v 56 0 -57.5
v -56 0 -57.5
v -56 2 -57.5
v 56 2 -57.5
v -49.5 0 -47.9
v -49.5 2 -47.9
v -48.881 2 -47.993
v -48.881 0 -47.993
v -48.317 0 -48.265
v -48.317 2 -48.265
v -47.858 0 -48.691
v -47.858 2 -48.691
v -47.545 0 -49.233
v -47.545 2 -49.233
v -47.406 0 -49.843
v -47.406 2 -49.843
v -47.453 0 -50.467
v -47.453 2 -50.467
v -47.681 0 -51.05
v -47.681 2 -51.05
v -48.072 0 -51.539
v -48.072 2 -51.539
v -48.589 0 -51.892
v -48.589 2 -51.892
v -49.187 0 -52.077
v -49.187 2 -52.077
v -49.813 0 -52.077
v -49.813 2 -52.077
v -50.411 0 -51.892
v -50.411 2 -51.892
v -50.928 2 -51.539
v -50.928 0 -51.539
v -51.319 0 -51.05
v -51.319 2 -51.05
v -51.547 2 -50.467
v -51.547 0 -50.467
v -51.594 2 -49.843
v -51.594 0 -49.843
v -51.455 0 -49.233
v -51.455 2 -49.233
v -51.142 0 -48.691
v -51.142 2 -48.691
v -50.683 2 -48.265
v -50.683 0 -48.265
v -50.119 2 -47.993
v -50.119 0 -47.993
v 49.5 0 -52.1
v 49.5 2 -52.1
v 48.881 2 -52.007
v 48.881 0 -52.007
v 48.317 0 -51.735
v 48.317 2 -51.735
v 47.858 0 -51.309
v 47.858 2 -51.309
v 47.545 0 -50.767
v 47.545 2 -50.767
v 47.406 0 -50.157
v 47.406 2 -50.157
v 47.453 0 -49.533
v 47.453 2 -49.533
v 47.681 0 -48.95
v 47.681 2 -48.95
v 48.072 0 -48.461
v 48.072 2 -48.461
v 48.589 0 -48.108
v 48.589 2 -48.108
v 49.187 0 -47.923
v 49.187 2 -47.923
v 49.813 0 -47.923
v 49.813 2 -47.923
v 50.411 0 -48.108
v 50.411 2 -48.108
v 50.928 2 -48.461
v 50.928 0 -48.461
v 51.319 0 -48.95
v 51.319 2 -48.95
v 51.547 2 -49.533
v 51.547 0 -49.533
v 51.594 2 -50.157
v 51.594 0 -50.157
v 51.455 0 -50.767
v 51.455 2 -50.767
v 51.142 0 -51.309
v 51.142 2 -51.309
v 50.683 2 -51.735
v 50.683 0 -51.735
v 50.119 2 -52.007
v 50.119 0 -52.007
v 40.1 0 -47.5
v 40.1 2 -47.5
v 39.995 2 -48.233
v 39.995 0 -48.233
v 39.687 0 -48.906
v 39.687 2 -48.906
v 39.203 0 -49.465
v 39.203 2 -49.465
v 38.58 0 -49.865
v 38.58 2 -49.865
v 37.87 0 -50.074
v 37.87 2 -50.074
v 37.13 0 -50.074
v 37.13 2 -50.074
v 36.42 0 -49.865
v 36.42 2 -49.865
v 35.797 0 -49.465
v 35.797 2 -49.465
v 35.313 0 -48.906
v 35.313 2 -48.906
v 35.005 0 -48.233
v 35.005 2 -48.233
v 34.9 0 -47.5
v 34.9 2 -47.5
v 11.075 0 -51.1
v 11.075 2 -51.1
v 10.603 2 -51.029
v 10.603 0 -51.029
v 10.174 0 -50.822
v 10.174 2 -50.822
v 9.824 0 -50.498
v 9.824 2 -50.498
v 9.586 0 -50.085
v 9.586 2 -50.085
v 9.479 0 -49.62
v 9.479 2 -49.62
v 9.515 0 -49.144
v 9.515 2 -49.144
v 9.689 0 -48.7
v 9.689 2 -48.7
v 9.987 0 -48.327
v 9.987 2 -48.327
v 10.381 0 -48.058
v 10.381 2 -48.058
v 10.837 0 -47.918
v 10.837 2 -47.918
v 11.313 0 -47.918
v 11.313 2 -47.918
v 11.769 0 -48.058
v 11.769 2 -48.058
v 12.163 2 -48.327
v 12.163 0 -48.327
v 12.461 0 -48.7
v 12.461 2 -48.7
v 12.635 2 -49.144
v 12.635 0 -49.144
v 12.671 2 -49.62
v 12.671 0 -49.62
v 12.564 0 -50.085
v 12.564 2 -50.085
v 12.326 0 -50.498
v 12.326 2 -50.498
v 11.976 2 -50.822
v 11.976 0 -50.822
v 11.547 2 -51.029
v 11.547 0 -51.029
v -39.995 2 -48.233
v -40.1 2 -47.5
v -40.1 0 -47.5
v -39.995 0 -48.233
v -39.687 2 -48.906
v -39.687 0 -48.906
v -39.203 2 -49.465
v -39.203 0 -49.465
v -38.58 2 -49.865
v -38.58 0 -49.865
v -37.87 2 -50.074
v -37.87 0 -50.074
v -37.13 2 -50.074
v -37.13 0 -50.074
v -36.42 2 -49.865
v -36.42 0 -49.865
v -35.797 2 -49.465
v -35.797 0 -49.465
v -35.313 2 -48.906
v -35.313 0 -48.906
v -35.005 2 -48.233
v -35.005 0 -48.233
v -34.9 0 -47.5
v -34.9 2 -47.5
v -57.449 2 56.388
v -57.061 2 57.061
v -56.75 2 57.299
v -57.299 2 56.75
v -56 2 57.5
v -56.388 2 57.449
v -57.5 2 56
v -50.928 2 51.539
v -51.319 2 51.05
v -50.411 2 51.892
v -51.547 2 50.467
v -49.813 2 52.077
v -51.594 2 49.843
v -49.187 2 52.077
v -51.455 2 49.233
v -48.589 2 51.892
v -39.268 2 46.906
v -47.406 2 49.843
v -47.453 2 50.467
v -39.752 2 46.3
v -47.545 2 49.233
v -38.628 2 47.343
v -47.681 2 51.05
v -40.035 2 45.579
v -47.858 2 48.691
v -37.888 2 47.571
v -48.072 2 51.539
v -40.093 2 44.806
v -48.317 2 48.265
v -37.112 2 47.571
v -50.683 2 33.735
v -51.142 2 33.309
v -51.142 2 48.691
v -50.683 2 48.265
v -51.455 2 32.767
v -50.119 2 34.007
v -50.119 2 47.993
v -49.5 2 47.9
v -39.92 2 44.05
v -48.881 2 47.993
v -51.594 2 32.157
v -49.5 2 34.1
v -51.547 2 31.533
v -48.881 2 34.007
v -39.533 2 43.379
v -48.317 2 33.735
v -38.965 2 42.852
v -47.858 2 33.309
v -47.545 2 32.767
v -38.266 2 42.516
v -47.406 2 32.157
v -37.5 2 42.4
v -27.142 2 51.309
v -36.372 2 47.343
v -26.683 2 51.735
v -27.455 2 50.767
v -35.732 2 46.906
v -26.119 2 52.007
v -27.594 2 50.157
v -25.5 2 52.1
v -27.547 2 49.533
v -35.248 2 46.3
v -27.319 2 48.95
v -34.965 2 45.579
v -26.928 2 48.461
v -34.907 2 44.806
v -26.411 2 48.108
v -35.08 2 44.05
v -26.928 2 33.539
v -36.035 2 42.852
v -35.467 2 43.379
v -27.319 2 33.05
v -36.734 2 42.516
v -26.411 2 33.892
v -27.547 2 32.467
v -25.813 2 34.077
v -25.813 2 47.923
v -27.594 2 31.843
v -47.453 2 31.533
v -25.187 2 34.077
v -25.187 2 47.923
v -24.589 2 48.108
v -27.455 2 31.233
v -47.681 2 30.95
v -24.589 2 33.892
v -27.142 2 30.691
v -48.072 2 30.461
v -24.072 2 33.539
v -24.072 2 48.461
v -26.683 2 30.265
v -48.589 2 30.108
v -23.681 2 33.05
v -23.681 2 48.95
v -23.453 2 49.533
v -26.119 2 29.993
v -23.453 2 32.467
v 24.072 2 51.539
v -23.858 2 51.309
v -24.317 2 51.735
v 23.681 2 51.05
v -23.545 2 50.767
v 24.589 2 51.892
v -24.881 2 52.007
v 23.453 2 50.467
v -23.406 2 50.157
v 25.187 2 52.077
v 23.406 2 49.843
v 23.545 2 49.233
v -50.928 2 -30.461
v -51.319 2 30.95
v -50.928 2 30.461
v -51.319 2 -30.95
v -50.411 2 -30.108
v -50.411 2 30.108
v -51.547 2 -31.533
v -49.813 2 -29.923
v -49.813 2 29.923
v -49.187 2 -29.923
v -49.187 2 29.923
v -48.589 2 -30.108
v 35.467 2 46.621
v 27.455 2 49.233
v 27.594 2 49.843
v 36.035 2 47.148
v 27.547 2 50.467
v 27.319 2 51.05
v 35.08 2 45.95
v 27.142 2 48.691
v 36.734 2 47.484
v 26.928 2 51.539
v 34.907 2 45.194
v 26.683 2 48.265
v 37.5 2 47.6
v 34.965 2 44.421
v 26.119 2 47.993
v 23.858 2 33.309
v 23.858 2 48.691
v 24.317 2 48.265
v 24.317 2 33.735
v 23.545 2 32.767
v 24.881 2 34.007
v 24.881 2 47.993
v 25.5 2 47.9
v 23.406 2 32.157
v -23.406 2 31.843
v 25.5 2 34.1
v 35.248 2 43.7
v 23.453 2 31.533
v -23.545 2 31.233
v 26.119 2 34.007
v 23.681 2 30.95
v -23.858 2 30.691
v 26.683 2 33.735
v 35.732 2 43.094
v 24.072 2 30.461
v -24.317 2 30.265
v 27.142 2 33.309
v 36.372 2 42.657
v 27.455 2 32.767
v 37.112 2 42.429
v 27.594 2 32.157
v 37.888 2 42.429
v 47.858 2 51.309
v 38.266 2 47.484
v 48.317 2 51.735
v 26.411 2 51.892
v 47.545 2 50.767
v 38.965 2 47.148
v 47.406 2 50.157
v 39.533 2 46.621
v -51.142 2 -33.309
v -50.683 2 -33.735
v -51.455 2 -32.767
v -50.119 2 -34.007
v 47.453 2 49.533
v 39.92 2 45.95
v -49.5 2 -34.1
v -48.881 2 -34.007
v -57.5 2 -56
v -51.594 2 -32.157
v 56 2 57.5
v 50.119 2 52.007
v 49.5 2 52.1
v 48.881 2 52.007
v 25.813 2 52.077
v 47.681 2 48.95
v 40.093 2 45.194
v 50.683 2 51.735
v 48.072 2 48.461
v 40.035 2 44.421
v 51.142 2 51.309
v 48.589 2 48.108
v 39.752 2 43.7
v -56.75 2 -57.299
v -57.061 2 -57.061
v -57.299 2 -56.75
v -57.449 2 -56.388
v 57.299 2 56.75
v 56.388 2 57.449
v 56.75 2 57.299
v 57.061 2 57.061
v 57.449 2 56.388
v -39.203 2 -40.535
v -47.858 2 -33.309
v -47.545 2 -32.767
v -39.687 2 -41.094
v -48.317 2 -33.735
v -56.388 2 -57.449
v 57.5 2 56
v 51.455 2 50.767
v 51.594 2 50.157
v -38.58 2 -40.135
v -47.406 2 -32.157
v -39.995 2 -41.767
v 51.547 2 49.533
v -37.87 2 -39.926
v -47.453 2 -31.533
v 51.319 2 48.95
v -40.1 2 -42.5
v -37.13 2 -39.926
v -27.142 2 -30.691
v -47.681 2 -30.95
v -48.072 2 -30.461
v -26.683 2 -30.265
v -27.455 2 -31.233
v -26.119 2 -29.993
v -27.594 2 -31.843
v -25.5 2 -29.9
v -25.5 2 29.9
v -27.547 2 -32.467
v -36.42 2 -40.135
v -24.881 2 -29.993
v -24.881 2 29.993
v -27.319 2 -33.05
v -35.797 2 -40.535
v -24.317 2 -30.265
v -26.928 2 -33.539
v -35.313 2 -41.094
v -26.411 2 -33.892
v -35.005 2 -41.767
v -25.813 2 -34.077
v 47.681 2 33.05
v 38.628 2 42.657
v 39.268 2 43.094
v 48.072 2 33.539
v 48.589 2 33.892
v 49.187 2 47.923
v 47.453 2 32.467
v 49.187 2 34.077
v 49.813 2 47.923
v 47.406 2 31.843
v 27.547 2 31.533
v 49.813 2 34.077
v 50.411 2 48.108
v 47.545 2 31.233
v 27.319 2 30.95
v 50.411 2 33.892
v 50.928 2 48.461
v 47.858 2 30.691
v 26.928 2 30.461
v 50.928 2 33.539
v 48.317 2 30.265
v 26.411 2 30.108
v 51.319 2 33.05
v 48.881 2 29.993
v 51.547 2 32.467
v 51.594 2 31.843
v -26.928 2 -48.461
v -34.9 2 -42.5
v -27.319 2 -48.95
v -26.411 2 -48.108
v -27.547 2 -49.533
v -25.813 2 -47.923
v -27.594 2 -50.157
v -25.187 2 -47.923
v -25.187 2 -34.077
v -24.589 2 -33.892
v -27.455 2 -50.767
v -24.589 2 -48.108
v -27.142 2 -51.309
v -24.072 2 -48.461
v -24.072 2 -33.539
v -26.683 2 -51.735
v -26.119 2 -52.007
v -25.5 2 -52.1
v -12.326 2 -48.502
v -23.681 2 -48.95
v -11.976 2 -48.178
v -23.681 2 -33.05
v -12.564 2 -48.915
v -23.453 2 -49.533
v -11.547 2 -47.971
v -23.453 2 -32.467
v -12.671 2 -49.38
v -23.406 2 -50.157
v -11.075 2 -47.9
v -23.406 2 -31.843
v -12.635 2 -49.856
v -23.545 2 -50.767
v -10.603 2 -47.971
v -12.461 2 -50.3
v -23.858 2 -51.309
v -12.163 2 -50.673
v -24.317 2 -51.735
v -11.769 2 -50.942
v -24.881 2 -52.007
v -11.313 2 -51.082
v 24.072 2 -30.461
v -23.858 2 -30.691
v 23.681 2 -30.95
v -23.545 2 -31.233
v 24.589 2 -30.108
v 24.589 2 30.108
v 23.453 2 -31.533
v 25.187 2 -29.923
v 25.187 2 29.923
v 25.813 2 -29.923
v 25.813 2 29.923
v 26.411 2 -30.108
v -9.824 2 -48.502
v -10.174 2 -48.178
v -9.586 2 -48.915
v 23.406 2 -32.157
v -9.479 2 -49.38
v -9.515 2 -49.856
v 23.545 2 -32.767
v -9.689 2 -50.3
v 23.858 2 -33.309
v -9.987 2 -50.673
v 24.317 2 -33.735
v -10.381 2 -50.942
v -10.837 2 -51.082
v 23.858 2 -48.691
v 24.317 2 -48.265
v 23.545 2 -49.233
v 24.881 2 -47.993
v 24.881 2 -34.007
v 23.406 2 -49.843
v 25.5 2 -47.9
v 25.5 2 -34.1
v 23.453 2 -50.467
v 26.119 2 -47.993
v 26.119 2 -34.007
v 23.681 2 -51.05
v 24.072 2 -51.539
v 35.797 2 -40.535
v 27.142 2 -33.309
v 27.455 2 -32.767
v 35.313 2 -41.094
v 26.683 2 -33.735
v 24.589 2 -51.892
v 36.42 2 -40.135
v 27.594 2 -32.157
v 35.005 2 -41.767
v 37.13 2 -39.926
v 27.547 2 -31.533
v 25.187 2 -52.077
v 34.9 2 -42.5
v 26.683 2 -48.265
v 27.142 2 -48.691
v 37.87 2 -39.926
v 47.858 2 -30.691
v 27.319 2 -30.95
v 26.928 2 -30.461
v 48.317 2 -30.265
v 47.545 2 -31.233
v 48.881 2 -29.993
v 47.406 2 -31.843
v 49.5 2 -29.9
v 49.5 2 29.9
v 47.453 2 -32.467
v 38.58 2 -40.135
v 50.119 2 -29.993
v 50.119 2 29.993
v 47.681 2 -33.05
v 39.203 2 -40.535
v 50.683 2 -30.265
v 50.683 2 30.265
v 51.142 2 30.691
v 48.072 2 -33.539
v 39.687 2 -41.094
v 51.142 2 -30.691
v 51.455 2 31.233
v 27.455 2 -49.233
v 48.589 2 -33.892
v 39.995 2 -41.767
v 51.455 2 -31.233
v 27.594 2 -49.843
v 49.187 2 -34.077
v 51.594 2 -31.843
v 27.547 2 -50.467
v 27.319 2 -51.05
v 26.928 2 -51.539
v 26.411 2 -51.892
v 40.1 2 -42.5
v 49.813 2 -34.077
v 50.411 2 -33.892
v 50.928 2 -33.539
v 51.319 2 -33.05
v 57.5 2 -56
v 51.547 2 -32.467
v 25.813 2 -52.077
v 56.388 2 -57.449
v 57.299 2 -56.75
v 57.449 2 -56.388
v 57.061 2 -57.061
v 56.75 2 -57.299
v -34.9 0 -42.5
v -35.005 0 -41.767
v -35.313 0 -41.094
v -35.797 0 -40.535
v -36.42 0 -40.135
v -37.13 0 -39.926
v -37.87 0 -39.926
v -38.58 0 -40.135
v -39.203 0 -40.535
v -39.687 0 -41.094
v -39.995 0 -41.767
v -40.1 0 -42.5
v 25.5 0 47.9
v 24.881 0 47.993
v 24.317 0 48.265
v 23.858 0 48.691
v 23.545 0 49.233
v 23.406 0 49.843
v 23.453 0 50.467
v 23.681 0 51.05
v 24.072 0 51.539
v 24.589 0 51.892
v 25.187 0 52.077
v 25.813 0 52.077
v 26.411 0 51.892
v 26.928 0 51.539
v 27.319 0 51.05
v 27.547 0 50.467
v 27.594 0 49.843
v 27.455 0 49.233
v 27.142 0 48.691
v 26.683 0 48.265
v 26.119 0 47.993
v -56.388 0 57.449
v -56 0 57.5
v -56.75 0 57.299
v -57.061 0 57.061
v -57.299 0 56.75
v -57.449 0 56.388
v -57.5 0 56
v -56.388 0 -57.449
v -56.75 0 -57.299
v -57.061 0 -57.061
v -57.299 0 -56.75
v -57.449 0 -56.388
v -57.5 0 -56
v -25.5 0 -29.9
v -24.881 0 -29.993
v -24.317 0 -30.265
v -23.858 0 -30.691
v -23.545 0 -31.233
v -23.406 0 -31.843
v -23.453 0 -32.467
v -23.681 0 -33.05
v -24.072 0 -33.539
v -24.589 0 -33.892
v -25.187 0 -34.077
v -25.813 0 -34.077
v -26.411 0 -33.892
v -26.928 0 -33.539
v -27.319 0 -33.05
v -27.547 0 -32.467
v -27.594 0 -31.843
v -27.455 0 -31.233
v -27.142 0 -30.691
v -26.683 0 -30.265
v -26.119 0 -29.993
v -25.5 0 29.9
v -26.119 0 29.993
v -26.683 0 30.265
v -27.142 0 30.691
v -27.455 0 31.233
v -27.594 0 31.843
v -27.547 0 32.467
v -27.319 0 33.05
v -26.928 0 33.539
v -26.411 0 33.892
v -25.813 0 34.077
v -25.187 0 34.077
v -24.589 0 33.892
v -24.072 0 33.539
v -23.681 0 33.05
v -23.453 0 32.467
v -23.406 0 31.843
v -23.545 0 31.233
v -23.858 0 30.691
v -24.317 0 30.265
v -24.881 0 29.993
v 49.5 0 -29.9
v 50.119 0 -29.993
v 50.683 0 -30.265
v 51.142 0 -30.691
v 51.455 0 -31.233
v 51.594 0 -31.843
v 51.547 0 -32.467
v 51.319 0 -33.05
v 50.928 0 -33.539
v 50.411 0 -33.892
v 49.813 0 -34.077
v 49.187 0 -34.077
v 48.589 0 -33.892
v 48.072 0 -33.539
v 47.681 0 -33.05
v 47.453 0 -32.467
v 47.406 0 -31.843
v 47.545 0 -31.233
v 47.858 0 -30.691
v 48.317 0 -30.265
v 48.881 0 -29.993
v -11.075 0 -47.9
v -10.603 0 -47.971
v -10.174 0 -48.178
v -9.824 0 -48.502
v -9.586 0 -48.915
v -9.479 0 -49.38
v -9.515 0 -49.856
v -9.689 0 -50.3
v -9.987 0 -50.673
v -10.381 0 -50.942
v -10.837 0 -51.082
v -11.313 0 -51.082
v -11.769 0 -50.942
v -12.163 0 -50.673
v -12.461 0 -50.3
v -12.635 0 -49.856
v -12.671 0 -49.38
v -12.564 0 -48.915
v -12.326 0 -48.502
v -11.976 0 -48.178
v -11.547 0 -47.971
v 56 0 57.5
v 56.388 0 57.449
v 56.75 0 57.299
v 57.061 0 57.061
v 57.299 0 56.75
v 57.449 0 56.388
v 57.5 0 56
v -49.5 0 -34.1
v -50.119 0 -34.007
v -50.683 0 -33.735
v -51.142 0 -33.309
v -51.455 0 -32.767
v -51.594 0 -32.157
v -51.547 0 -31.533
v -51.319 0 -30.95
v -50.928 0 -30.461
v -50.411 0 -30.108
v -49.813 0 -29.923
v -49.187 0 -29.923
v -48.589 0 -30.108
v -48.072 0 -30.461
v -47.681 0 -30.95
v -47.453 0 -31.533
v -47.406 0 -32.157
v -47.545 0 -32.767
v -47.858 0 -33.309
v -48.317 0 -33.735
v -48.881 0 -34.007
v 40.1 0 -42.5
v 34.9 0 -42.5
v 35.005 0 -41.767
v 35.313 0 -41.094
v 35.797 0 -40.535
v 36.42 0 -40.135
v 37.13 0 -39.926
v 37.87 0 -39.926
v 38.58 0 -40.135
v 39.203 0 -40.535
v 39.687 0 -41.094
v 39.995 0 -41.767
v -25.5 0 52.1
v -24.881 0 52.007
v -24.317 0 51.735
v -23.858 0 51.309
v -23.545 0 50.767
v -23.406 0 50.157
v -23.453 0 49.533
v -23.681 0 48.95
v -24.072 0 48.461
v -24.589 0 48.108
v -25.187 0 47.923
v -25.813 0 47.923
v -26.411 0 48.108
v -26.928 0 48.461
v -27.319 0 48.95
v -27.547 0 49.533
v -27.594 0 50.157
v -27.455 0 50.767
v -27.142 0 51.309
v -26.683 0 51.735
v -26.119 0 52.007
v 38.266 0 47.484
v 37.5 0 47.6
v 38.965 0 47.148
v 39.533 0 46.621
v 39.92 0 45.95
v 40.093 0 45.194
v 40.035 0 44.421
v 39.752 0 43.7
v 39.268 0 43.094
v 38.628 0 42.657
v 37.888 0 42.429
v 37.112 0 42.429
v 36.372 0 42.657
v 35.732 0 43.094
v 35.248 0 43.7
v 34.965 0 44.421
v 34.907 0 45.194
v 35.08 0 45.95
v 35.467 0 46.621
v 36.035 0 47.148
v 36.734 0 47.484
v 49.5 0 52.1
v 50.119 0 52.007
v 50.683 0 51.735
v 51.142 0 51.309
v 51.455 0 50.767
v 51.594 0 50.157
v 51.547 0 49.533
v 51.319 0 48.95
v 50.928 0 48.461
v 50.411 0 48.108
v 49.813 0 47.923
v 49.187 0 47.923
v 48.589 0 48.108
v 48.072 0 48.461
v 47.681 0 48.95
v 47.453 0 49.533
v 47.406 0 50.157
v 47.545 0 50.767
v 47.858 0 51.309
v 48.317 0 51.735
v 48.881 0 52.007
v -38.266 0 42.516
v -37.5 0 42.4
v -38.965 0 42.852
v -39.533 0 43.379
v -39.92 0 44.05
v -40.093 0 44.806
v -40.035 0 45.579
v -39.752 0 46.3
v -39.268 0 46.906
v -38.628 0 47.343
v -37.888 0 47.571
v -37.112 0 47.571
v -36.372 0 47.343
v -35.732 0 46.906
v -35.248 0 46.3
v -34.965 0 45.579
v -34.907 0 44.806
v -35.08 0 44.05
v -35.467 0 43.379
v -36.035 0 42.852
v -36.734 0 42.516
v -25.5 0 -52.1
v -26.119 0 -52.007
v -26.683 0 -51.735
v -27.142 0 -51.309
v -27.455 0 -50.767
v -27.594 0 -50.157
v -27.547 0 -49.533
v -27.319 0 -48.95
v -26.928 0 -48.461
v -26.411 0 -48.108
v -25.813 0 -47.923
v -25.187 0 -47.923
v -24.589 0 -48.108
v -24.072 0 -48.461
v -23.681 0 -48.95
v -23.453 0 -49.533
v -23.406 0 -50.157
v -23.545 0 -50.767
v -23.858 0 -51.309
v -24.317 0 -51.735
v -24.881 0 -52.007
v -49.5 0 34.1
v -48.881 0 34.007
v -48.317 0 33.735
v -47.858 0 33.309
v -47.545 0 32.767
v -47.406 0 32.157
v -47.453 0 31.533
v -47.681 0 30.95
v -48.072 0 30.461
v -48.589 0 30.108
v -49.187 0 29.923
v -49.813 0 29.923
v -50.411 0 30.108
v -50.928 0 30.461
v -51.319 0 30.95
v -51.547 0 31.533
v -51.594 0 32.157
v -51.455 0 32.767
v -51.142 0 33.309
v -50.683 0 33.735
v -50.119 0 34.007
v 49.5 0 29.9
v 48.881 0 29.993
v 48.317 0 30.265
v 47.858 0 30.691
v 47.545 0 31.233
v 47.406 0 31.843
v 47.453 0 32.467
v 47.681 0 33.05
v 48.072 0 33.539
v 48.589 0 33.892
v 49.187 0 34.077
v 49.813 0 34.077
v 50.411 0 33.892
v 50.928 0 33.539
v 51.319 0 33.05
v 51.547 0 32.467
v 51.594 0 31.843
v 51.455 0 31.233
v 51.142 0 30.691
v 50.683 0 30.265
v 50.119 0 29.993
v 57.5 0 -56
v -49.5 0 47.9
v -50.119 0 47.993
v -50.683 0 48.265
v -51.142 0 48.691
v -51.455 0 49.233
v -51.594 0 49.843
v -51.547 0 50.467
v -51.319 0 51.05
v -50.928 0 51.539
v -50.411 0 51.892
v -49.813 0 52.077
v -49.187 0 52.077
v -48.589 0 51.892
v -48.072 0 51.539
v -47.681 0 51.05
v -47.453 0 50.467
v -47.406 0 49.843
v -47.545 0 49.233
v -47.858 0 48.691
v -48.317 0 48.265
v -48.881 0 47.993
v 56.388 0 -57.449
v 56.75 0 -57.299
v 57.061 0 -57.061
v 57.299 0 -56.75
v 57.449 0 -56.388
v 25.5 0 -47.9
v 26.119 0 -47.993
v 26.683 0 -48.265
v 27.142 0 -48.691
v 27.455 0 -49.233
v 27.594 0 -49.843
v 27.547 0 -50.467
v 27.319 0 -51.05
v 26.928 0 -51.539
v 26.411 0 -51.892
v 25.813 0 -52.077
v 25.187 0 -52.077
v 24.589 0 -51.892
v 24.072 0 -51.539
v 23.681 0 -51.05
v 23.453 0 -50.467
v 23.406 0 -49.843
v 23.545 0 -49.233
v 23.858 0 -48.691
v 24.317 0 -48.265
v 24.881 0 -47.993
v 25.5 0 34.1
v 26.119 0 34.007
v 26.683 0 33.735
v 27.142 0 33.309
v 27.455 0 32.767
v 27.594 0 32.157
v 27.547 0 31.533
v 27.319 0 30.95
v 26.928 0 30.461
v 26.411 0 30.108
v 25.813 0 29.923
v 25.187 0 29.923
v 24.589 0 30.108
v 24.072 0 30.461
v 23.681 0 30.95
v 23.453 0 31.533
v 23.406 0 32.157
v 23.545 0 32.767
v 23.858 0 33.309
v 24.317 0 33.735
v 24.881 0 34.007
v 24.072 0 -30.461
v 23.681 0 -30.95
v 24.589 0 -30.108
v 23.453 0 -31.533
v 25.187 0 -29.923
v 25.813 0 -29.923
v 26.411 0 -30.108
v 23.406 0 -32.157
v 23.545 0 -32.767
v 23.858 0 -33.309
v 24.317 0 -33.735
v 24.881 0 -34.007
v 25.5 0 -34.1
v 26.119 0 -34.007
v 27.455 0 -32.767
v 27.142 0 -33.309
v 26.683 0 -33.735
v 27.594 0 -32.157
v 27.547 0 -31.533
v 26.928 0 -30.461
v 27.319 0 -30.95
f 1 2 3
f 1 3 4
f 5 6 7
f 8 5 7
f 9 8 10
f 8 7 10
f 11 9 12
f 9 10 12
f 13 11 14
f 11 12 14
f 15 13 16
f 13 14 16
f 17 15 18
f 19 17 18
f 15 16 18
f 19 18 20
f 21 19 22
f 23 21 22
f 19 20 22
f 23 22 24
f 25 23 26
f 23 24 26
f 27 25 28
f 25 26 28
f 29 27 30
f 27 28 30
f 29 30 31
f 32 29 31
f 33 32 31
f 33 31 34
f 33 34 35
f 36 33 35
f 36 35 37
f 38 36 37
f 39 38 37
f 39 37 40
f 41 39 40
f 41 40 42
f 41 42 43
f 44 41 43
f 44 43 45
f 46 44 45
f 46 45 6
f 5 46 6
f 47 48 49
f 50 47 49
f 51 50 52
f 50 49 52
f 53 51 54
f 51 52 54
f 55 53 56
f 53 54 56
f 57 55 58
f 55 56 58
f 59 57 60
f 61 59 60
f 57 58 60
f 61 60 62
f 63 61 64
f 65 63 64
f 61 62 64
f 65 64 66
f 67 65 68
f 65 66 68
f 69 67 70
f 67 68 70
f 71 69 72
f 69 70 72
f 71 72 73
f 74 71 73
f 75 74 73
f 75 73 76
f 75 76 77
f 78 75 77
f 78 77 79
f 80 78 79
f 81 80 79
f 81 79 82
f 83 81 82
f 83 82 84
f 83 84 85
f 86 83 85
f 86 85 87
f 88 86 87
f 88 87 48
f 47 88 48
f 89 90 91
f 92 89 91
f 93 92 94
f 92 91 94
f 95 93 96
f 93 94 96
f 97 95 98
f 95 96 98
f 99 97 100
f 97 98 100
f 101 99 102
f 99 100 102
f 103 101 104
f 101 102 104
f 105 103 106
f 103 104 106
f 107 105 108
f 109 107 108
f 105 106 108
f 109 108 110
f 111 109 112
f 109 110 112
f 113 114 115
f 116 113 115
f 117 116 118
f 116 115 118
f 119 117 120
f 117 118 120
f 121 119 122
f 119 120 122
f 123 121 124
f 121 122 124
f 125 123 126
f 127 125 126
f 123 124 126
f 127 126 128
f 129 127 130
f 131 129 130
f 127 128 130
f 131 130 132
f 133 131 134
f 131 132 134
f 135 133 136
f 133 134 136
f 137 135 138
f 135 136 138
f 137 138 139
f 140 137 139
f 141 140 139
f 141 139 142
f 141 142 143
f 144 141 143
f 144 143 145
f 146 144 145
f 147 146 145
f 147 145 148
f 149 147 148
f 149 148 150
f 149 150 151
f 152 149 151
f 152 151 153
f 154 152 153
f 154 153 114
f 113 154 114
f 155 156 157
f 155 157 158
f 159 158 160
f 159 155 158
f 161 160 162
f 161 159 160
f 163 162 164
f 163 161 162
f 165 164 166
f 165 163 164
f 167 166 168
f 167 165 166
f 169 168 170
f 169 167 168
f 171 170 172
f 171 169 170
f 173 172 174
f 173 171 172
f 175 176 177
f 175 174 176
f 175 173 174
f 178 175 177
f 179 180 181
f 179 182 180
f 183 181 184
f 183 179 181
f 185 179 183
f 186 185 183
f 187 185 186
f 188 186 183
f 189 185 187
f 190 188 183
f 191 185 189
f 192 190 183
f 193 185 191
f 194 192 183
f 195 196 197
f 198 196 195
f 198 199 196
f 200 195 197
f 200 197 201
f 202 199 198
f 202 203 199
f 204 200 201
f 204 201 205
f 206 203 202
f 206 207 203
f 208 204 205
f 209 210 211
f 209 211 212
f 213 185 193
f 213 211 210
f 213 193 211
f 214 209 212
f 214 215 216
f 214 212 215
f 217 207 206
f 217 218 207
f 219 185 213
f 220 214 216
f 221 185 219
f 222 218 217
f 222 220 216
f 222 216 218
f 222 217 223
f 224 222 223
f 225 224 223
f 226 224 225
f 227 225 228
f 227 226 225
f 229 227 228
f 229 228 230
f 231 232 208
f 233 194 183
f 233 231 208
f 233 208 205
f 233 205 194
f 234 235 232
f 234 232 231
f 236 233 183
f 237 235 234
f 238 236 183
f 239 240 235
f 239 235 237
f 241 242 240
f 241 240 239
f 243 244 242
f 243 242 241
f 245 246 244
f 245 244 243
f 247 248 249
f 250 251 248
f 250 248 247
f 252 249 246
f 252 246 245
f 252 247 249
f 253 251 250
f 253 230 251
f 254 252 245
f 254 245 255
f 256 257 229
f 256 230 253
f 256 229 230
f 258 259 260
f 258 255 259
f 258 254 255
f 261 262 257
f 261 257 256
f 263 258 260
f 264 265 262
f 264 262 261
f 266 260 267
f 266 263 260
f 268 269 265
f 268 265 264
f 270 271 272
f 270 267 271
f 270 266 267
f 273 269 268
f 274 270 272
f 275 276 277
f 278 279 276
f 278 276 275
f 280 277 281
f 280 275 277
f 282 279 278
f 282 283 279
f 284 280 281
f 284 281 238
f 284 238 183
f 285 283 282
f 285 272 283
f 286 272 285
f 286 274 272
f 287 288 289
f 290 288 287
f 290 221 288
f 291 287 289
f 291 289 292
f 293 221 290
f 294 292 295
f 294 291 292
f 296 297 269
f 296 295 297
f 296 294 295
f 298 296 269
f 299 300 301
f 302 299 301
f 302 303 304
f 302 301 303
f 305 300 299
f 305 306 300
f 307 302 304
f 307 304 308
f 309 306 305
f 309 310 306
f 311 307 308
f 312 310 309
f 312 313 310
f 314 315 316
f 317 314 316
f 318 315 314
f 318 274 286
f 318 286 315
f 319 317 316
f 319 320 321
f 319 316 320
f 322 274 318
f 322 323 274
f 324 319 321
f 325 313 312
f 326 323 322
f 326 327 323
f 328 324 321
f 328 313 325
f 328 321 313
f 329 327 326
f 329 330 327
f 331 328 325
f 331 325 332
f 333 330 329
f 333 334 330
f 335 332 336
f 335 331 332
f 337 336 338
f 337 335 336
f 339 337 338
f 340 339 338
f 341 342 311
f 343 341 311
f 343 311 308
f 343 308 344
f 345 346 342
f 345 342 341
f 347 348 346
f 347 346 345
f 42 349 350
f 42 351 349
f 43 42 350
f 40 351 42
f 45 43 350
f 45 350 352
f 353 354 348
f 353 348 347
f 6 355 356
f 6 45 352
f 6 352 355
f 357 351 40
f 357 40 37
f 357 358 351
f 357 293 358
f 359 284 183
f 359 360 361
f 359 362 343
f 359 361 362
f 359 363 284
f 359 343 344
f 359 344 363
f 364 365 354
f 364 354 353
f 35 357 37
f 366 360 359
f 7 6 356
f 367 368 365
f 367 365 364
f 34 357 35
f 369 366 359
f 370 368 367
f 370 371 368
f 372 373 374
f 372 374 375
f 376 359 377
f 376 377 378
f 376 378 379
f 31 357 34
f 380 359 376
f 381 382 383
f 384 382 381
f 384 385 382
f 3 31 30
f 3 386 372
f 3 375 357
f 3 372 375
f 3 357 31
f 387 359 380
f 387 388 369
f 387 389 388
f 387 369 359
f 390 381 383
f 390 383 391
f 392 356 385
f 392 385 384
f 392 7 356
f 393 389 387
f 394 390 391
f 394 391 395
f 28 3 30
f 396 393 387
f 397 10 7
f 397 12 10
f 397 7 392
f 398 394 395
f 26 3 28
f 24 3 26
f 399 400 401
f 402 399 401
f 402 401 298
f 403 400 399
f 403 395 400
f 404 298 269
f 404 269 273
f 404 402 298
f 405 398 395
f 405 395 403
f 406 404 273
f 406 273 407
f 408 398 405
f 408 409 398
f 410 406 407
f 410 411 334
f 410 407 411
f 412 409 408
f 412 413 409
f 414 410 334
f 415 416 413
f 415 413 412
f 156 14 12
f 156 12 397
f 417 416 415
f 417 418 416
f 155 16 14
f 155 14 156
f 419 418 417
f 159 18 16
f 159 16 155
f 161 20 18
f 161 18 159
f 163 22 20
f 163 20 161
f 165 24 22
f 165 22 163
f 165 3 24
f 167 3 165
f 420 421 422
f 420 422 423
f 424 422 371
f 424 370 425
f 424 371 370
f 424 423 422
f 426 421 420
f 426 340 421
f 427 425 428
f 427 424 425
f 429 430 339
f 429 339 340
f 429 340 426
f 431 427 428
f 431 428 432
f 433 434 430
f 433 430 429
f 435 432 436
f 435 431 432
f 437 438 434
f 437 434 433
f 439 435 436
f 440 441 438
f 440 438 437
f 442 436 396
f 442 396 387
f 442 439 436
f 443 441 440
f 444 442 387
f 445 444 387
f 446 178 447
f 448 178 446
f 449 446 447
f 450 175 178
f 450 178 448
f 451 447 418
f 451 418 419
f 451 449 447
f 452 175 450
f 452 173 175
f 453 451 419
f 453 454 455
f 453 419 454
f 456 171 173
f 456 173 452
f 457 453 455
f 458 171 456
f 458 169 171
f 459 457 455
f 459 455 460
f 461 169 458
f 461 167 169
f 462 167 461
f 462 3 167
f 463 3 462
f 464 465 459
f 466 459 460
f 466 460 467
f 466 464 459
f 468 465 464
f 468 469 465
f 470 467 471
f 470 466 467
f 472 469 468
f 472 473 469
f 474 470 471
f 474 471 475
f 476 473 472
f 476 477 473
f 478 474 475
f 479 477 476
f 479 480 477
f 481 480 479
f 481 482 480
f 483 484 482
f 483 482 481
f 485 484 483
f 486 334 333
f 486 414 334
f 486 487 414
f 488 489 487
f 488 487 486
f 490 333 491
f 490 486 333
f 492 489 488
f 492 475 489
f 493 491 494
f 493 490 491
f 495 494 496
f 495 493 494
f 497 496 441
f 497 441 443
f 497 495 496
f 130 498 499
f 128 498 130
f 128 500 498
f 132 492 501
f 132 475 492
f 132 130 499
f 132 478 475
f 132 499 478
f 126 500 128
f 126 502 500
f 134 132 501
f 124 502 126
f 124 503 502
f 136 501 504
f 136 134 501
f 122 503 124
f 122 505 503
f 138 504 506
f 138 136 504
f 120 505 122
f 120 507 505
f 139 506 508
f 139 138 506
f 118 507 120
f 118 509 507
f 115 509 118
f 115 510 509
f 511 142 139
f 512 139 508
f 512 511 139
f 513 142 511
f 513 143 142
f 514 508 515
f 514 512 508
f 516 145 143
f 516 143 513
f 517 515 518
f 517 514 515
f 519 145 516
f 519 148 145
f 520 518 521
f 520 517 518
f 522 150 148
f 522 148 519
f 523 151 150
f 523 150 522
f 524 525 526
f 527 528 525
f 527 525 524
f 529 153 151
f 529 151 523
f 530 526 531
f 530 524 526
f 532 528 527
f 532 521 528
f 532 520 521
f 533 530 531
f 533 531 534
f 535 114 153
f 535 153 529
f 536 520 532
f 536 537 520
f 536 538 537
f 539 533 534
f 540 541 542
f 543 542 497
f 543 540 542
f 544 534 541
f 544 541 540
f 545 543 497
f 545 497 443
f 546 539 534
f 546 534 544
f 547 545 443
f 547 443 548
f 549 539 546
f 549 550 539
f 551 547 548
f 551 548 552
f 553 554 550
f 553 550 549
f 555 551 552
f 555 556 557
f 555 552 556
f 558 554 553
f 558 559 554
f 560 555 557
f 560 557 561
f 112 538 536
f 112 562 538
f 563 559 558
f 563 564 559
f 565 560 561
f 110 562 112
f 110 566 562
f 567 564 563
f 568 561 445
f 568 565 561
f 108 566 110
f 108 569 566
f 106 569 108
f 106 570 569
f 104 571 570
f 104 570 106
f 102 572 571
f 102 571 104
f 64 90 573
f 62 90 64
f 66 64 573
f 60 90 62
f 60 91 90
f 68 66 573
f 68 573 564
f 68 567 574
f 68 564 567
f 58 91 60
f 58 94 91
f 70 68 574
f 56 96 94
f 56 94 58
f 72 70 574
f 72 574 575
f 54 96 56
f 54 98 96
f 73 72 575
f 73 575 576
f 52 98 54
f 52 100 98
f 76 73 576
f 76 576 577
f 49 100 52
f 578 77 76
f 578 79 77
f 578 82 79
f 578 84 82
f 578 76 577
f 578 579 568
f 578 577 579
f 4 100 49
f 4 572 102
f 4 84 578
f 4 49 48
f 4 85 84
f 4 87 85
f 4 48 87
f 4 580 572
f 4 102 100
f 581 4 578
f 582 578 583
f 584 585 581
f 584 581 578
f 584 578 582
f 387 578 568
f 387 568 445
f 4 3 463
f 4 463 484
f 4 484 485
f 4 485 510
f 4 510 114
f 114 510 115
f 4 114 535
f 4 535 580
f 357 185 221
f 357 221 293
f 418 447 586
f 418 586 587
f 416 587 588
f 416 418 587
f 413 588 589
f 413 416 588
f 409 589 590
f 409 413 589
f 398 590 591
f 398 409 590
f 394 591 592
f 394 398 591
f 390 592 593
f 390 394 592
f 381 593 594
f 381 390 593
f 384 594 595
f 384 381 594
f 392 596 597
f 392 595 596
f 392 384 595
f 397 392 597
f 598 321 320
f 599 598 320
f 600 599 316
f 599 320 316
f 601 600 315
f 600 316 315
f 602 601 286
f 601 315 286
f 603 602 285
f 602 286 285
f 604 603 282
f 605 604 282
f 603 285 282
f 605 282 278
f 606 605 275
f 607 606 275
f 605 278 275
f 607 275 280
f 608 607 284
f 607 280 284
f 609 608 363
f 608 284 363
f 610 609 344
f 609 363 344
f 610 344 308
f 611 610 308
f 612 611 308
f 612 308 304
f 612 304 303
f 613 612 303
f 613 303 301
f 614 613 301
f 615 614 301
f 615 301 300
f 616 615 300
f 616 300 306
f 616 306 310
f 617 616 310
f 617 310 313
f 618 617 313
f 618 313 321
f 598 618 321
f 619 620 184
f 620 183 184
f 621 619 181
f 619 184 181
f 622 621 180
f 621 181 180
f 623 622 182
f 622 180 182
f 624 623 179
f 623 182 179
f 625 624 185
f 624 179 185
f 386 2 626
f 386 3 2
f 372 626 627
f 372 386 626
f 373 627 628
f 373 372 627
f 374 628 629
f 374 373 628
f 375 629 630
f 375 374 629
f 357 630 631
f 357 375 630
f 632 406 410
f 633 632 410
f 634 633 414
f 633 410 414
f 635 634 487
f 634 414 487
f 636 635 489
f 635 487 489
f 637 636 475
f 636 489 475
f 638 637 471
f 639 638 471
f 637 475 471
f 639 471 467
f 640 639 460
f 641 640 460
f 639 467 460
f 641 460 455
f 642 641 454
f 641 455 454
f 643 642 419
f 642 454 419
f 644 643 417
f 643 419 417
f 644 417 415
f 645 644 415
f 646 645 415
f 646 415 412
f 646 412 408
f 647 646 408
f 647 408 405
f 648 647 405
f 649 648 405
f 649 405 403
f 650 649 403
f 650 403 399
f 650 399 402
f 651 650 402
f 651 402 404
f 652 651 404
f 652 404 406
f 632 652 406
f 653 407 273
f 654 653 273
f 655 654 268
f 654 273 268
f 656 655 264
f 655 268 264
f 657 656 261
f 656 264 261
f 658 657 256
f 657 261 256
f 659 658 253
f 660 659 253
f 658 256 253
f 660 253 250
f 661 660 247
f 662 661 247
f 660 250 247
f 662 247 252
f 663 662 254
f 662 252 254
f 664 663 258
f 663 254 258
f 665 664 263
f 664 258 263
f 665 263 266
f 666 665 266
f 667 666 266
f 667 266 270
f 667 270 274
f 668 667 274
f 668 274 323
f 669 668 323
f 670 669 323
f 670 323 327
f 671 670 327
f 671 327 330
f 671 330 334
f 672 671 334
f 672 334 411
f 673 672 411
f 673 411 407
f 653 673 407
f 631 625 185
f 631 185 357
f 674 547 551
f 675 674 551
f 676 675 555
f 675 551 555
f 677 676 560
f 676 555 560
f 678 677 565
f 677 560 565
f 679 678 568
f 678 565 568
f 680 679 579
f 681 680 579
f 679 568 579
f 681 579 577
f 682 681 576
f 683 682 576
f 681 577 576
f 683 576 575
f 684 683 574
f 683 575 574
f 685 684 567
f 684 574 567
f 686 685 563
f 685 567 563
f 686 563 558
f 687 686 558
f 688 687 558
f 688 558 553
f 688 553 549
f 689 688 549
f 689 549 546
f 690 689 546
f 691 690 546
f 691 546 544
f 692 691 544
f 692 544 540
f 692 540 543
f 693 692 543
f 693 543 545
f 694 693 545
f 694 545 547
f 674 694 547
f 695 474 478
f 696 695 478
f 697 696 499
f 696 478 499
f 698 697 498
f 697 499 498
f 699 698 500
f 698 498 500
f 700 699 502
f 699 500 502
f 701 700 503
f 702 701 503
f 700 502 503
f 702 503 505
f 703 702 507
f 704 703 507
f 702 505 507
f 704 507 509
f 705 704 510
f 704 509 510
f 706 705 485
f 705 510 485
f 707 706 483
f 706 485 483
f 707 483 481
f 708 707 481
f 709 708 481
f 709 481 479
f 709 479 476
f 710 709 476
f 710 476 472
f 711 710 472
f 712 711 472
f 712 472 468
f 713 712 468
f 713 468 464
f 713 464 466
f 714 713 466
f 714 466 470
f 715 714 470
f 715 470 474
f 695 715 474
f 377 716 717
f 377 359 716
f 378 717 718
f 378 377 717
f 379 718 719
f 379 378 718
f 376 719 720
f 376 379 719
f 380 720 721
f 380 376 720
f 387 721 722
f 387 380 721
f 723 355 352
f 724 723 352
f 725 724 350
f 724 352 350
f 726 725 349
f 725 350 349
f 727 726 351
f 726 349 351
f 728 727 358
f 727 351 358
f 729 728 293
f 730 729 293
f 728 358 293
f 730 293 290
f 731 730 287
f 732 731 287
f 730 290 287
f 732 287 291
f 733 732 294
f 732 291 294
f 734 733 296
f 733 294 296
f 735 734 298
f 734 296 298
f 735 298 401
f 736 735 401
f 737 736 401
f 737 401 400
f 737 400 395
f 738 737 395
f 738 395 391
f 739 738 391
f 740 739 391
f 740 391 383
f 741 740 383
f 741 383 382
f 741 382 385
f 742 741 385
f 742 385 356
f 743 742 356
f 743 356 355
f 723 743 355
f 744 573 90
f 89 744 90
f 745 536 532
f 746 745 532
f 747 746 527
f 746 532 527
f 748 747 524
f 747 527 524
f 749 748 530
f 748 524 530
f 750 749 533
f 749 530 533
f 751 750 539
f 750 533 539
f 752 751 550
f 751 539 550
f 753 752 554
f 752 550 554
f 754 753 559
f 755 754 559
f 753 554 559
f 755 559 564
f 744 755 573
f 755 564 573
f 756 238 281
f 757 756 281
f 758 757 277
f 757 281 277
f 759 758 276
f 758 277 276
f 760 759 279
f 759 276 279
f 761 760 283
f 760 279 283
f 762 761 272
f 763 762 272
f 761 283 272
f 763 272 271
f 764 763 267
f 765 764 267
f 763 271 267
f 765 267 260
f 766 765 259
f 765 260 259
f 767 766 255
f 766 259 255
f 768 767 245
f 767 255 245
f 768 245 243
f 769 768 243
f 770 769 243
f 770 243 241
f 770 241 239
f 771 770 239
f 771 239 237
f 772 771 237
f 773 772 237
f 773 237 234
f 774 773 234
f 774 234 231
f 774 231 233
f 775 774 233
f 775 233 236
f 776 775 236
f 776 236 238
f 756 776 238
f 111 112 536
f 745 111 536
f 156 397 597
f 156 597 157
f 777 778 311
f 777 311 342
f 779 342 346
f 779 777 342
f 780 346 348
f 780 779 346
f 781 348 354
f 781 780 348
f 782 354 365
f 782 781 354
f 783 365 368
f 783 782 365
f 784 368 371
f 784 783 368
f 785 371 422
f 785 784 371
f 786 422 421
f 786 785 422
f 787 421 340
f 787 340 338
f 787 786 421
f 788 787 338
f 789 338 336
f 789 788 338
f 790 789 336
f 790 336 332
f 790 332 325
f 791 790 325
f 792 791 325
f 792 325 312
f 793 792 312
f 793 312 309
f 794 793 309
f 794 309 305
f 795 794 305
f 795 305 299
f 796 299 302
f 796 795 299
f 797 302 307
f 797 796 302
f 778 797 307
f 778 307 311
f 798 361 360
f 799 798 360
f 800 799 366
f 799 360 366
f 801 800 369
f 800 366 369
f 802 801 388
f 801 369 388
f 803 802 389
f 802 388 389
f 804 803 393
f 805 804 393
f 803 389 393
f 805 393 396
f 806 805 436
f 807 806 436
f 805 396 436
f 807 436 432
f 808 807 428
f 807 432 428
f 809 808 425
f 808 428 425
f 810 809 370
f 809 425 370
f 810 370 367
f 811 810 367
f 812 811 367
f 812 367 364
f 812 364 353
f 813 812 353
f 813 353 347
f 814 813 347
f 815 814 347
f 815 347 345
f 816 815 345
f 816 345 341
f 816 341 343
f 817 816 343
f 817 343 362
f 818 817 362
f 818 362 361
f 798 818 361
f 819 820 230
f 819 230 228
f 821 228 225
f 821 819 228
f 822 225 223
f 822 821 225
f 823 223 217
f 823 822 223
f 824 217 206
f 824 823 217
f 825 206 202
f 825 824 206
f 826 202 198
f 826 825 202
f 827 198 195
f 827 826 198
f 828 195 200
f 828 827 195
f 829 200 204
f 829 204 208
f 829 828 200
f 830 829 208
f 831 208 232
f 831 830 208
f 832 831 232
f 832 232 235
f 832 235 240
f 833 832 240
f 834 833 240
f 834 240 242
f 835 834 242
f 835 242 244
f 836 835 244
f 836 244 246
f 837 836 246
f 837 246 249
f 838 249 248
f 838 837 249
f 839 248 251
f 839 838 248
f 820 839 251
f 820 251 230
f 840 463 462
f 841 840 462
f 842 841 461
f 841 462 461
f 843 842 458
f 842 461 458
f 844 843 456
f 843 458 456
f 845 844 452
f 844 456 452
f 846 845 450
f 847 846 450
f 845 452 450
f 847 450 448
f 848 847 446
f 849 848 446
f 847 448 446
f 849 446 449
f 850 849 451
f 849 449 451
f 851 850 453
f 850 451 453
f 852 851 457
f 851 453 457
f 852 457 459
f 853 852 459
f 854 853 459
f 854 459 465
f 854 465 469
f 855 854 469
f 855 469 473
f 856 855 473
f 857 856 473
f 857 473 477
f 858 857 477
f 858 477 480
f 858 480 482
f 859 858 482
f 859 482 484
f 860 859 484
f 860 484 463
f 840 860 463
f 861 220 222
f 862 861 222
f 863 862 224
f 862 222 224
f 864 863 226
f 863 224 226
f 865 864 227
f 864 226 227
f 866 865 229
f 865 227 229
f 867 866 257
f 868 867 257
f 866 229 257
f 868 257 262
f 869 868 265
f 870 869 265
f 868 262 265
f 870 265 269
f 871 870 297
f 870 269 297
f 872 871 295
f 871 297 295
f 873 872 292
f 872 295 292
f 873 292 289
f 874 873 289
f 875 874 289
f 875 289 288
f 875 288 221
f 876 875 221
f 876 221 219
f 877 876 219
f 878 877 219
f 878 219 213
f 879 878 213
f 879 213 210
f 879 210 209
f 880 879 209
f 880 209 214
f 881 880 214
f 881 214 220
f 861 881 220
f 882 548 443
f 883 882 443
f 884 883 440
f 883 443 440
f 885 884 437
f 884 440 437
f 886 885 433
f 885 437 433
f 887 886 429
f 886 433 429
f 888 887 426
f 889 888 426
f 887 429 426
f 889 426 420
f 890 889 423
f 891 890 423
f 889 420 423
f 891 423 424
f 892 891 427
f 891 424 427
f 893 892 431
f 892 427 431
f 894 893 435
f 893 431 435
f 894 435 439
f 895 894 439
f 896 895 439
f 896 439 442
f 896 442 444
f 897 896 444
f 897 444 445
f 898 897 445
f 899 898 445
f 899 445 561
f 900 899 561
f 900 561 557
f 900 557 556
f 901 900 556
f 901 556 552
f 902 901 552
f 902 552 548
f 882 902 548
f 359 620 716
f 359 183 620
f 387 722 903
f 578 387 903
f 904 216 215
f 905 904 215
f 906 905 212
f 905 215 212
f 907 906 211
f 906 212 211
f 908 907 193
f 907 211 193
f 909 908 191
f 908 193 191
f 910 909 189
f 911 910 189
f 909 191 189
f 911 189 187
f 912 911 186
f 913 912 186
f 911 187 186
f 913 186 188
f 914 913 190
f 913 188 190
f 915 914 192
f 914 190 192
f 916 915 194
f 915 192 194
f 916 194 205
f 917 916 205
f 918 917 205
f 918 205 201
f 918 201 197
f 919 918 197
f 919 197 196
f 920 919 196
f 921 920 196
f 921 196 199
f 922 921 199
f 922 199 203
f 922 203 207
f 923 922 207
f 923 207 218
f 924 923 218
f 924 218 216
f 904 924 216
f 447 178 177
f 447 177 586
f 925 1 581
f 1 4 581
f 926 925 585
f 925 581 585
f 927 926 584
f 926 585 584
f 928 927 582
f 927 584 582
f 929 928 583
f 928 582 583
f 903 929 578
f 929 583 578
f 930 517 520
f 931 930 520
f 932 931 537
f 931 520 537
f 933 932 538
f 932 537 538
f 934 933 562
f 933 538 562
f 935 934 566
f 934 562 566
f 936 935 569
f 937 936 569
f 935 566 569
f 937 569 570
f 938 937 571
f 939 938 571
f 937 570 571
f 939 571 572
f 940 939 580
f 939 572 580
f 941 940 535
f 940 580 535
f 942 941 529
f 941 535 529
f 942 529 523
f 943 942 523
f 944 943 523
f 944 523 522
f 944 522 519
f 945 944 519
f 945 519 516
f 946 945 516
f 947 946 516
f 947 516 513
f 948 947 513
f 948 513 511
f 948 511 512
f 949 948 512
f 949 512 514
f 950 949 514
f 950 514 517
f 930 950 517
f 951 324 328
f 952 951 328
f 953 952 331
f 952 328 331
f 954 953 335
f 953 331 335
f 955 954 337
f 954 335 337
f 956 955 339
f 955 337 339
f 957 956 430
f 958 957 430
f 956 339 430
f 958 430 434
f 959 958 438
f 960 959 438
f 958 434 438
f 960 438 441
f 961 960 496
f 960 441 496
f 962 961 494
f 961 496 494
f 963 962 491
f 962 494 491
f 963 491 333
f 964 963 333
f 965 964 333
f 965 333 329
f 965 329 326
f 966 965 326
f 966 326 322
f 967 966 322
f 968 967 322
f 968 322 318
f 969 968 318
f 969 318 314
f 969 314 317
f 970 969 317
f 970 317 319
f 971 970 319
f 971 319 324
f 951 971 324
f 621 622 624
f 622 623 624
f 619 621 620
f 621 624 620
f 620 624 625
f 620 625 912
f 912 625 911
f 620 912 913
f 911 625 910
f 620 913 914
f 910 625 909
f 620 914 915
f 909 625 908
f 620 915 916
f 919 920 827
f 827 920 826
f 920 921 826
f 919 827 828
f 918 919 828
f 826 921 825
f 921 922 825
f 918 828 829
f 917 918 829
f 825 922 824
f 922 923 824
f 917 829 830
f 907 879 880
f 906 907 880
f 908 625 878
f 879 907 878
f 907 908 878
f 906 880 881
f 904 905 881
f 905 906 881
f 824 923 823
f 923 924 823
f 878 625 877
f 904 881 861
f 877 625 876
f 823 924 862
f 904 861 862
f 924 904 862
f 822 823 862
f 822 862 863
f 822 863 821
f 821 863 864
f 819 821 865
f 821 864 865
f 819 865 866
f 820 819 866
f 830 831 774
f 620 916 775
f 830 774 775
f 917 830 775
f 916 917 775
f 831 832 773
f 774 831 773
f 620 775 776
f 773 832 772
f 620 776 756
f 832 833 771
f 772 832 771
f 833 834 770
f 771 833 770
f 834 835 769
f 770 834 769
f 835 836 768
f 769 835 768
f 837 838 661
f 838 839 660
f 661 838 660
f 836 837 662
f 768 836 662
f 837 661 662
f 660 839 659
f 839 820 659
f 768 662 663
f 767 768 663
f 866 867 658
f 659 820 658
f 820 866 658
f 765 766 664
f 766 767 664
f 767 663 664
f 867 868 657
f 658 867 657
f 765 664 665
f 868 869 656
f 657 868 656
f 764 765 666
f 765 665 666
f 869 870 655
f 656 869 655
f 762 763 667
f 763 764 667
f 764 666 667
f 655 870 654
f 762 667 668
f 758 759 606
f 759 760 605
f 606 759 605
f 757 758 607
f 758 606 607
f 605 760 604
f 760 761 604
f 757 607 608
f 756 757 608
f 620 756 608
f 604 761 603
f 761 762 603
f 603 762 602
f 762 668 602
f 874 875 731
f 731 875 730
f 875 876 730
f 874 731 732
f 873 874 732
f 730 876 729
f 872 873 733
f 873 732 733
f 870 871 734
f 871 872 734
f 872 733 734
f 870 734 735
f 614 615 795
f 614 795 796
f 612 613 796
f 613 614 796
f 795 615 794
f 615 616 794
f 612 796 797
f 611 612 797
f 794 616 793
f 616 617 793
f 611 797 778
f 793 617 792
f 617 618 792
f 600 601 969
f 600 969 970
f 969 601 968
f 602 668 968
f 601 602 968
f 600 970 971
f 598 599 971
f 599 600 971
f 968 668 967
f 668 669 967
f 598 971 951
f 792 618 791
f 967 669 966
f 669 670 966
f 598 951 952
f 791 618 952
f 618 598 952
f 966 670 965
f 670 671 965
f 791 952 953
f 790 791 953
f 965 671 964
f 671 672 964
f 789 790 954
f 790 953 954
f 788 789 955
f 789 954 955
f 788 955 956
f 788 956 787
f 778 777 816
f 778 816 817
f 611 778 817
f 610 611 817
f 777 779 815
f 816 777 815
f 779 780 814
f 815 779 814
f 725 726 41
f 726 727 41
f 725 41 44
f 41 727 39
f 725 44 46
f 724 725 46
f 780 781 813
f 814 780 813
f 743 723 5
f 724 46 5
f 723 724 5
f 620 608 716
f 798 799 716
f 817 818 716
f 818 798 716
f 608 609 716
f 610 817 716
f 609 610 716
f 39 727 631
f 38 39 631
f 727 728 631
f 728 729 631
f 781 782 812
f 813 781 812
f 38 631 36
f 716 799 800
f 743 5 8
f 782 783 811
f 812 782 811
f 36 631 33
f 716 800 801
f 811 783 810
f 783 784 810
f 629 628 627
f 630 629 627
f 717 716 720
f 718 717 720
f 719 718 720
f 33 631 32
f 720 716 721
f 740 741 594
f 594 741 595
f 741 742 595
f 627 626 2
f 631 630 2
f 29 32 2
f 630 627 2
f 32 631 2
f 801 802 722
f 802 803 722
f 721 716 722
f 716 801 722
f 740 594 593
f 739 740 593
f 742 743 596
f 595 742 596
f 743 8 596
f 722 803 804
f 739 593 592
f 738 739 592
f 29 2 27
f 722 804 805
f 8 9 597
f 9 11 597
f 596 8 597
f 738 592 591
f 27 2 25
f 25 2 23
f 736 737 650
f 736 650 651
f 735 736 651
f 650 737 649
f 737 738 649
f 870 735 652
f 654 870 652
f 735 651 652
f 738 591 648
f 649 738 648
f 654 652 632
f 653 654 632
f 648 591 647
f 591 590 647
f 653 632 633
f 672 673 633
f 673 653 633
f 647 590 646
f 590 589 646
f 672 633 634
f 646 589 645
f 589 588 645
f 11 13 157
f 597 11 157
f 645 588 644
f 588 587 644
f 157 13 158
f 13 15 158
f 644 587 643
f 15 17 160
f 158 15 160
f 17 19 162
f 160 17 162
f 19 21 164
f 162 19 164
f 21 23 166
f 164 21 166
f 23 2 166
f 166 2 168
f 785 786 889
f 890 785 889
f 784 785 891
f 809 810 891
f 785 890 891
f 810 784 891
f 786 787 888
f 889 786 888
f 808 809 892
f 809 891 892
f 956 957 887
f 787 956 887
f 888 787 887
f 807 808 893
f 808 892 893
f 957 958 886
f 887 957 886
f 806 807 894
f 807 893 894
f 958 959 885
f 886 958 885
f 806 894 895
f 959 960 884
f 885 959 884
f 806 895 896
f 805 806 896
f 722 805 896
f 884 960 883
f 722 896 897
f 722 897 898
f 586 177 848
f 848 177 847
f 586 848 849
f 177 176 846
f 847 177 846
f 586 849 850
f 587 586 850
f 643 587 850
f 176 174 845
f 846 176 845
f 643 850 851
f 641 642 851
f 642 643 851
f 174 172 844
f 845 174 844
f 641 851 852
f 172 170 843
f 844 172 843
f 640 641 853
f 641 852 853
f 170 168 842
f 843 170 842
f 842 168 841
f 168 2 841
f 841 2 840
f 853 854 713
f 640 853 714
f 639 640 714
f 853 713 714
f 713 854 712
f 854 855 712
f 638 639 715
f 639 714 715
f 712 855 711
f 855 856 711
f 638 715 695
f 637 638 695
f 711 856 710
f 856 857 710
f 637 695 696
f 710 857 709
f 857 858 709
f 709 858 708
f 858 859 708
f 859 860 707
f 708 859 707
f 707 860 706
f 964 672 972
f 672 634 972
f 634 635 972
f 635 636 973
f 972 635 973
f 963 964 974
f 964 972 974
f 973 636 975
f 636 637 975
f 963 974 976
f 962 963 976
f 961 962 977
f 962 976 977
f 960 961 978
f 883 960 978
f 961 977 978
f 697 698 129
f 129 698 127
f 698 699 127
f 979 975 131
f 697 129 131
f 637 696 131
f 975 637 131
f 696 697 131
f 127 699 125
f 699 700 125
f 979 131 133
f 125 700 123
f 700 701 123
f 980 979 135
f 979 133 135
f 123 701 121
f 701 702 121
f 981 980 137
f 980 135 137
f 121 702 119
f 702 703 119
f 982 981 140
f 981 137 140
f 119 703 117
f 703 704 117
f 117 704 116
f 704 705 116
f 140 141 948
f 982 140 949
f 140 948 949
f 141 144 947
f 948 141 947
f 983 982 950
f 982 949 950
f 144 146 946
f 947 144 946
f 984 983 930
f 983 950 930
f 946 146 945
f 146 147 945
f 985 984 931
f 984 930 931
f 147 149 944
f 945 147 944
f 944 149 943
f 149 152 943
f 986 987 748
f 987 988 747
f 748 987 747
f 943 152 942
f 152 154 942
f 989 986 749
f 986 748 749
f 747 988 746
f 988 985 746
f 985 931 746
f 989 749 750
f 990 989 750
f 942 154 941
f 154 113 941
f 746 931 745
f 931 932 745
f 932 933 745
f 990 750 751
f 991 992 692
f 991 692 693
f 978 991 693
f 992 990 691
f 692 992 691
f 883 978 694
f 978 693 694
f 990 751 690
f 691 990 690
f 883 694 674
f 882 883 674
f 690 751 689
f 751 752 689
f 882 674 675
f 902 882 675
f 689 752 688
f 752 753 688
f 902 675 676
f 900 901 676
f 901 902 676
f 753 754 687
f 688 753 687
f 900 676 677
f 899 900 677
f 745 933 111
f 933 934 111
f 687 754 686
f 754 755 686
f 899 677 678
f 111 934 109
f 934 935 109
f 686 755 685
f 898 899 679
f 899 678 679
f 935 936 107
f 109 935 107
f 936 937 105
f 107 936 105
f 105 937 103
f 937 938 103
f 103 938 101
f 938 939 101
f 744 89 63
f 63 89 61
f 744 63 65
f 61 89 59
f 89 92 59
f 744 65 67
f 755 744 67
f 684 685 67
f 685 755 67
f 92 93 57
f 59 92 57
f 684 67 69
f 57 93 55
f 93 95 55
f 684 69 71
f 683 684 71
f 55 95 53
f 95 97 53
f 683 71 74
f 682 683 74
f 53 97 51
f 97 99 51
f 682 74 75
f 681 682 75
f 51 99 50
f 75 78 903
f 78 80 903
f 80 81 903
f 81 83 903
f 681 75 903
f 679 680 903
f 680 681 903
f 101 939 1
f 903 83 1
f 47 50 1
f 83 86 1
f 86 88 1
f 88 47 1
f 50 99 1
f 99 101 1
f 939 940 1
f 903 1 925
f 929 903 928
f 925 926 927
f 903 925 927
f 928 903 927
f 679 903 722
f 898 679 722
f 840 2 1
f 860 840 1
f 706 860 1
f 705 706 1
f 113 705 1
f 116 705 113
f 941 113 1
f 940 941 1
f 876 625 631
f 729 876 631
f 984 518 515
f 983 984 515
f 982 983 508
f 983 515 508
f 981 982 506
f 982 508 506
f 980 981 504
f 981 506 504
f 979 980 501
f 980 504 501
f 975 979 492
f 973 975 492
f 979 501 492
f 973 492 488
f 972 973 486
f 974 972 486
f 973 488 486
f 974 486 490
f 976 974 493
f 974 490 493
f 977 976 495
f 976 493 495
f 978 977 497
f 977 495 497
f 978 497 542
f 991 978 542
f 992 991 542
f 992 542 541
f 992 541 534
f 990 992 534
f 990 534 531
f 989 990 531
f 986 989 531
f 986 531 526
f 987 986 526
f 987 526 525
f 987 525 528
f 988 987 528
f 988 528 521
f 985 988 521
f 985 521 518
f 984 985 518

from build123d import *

# Parameters (mm, degrees)
SKETCH1_W           = 115
SKETCH1_H           = 115
SKETCH1_R           = 2.6
BOSS_EXTRUDE1_DEPTH = 2
SKETCH2_R           = 2.1
CUT_EXTRUDE1_DEPTH  = 82.341871137
SKETCH3_W           = 17.5
SKETCH3_H           = 22.5
CUT_EXTRUDE2_DEPTH  = 82.341871137
SKETCH4_R           = 1.6
CUT_EXTRUDE3_DEPTH  = 82.341871137
CUT_EXTRUDE4_DEPTH  = 82.341871137
SKETCH7_W           = 17.5
SKETCH7_H           = 22.5
BOSS_EXTRUDE2_DEPTH = 2
FILLET1_R           = 1.5


with BuildPart() as part:
    # Sketch1 → Boss-Extrude1 (new body)
    with BuildSketch(Plane(origin=(0, 0, 0), x_dir=(1, 0, 0), z_dir=(0, 1, 0))):
        Rectangle(SKETCH1_W, SKETCH1_H)
        with Locations(Location((-37.5, 45, 0), (0, 0, 270))):
            Circle(SKETCH1_R, mode=Mode.SUBTRACT)
        with Locations(Location((37.5, 45, 0), (0, 0, 90))):
            Circle(SKETCH1_R, mode=Mode.SUBTRACT)
        with Locations(Location((37.5, -45, 0), (0, 0, 270))):
            Circle(SKETCH1_R, mode=Mode.SUBTRACT)
        with Locations(Location((-37.5, -45, 0), (0, 0, 90))):
            Circle(SKETCH1_R, mode=Mode.SUBTRACT)
    extrude(amount=BOSS_EXTRUDE1_DEPTH)

    # Sketch2 → Cut-Extrude1 (cut, through all)
    with BuildSketch(Plane(origin=(0, 2, 0), x_dir=(1, 0, 0), z_dir=(0, 1, 0))):
        with Locations(Location((-49.5, -32, 0), (0, 0, 270))):
            Circle(SKETCH2_R)
        with Locations(Location((-25.5, -32, 0), (0, 0, 90))):
            Circle(SKETCH2_R)
        with Locations(Location((-25.5, -50, 0), (0, 0, 270))):
            Circle(SKETCH2_R)
        with Locations(Location((-49.5, -50, 0), (0, 0, 90))):
            Circle(SKETCH2_R)
        with Locations(Location((25.5, -50, 0), (0, 0, 90))):
            Circle(SKETCH2_R)
        with Locations(Location((49.5, -50, 0), (0, 0, 270))):
            Circle(SKETCH2_R)
        with Locations(Location((49.5, -32, 0), (0, 0, 90))):
            Circle(SKETCH2_R)
        with Locations(Location((25.5, -32, 0), (0, 0, 270))):
            Circle(SKETCH2_R)
        with Locations(Location((49.5, 50, 0), (0, 0, 90))):
            Circle(SKETCH2_R)
        with Locations(Location((49.5, 32, 0), (0, 0, 270))):
            Circle(SKETCH2_R)
        with Locations(Location((25.5, 50, 0), (0, 0, 270))):
            Circle(SKETCH2_R)
        with Locations(Location((25.5, 32, 0), (0, 0, 90))):
            Circle(SKETCH2_R)
        with Locations(Location((-25.5, 50, 0), (0, 0, 90))):
            Circle(SKETCH2_R)
        with Locations(Location((-49.5, 50, 0), (0, 0, 270))):
            Circle(SKETCH2_R)
        with Locations(Location((-49.5, 32, 0), (0, 0, 90))):
            Circle(SKETCH2_R)
        with Locations(Location((-25.5, 32, 0), (0, 0, 270))):
            Circle(SKETCH2_R)
    extrude(amount=-CUT_EXTRUDE1_DEPTH, mode=Mode.SUBTRACT)

    # Sketch3 → Cut-Extrude2 (cut, through all)
    with BuildSketch(Plane(origin=(0, 2, 0), x_dir=(1, 0, 0), z_dir=(0, 1, 0))):
        with Locations((0, -46.25)):
            Rectangle(SKETCH3_W, SKETCH3_H)
    extrude(amount=-CUT_EXTRUDE2_DEPTH, mode=Mode.SUBTRACT)

    # Sketch4 → Cut-Extrude3 (cut, through all)
    with BuildSketch(Plane(origin=(0, 2, 0), x_dir=(1, 0, 0), z_dir=(0, 1, 0))):
        with Locations(Location((-11.075, 49.5, 0), (0, 0, 270))):
            Circle(SKETCH4_R)
        with Locations(Location((11.075, 49.5, 0), (0, 0, 90))):
            Circle(SKETCH4_R)
    extrude(amount=-CUT_EXTRUDE3_DEPTH, mode=Mode.SUBTRACT)

    # Sketch6 → Cut-Extrude4 (cut, through all)
    with BuildSketch(Plane(origin=(0, 2, 0), x_dir=(1, 0, 0), z_dir=(0, 1, 0))):
        with BuildLine():
            Line((-34.9, 47.5), (-34.9, 42.5))
            ThreePointArc((-34.9, 42.5), (-37.5, 39.9), (-40.1, 42.5))
            Line((-40.1, 42.5), (-40.1, 47.5))
            ThreePointArc((-40.1, 47.5), (-37.5, 50.1), (-34.9, 47.5))
        make_face()
        with BuildLine():
            Line((34.9, 47.5), (34.9, 42.5))
            ThreePointArc((34.9, 42.5), (37.5, 39.9), (40.1, 42.5))
            Line((40.1, 42.5), (40.1, 47.5))
            ThreePointArc((40.1, 47.5), (37.5, 50.1), (34.9, 47.5))
        make_face()
    extrude(amount=-CUT_EXTRUDE4_DEPTH, mode=Mode.SUBTRACT)

    # Sketch7 → Boss-Extrude2 (add, through all)
    with BuildSketch(Plane(origin=(0, 2, 0), x_dir=(1, 0, 0), z_dir=(0, 1, 0))):
        with Locations((0, -46.25)):
            Rectangle(SKETCH7_W, SKETCH7_H)
    extrude(amount=-BOSS_EXTRUDE2_DEPTH)

    # Fillet1
    fillet1_edges = [part.edges().sort_by_distance(p)[0] for p in [
        (57.5, 1, 57.5),
        (-57.5, 1, 57.5),
        (-57.5, 1, -57.5),
        (57.5, 1, -57.5),
    ]]
    fillet(fillet1_edges, radius=FILLET1_R)


solid = part.part
